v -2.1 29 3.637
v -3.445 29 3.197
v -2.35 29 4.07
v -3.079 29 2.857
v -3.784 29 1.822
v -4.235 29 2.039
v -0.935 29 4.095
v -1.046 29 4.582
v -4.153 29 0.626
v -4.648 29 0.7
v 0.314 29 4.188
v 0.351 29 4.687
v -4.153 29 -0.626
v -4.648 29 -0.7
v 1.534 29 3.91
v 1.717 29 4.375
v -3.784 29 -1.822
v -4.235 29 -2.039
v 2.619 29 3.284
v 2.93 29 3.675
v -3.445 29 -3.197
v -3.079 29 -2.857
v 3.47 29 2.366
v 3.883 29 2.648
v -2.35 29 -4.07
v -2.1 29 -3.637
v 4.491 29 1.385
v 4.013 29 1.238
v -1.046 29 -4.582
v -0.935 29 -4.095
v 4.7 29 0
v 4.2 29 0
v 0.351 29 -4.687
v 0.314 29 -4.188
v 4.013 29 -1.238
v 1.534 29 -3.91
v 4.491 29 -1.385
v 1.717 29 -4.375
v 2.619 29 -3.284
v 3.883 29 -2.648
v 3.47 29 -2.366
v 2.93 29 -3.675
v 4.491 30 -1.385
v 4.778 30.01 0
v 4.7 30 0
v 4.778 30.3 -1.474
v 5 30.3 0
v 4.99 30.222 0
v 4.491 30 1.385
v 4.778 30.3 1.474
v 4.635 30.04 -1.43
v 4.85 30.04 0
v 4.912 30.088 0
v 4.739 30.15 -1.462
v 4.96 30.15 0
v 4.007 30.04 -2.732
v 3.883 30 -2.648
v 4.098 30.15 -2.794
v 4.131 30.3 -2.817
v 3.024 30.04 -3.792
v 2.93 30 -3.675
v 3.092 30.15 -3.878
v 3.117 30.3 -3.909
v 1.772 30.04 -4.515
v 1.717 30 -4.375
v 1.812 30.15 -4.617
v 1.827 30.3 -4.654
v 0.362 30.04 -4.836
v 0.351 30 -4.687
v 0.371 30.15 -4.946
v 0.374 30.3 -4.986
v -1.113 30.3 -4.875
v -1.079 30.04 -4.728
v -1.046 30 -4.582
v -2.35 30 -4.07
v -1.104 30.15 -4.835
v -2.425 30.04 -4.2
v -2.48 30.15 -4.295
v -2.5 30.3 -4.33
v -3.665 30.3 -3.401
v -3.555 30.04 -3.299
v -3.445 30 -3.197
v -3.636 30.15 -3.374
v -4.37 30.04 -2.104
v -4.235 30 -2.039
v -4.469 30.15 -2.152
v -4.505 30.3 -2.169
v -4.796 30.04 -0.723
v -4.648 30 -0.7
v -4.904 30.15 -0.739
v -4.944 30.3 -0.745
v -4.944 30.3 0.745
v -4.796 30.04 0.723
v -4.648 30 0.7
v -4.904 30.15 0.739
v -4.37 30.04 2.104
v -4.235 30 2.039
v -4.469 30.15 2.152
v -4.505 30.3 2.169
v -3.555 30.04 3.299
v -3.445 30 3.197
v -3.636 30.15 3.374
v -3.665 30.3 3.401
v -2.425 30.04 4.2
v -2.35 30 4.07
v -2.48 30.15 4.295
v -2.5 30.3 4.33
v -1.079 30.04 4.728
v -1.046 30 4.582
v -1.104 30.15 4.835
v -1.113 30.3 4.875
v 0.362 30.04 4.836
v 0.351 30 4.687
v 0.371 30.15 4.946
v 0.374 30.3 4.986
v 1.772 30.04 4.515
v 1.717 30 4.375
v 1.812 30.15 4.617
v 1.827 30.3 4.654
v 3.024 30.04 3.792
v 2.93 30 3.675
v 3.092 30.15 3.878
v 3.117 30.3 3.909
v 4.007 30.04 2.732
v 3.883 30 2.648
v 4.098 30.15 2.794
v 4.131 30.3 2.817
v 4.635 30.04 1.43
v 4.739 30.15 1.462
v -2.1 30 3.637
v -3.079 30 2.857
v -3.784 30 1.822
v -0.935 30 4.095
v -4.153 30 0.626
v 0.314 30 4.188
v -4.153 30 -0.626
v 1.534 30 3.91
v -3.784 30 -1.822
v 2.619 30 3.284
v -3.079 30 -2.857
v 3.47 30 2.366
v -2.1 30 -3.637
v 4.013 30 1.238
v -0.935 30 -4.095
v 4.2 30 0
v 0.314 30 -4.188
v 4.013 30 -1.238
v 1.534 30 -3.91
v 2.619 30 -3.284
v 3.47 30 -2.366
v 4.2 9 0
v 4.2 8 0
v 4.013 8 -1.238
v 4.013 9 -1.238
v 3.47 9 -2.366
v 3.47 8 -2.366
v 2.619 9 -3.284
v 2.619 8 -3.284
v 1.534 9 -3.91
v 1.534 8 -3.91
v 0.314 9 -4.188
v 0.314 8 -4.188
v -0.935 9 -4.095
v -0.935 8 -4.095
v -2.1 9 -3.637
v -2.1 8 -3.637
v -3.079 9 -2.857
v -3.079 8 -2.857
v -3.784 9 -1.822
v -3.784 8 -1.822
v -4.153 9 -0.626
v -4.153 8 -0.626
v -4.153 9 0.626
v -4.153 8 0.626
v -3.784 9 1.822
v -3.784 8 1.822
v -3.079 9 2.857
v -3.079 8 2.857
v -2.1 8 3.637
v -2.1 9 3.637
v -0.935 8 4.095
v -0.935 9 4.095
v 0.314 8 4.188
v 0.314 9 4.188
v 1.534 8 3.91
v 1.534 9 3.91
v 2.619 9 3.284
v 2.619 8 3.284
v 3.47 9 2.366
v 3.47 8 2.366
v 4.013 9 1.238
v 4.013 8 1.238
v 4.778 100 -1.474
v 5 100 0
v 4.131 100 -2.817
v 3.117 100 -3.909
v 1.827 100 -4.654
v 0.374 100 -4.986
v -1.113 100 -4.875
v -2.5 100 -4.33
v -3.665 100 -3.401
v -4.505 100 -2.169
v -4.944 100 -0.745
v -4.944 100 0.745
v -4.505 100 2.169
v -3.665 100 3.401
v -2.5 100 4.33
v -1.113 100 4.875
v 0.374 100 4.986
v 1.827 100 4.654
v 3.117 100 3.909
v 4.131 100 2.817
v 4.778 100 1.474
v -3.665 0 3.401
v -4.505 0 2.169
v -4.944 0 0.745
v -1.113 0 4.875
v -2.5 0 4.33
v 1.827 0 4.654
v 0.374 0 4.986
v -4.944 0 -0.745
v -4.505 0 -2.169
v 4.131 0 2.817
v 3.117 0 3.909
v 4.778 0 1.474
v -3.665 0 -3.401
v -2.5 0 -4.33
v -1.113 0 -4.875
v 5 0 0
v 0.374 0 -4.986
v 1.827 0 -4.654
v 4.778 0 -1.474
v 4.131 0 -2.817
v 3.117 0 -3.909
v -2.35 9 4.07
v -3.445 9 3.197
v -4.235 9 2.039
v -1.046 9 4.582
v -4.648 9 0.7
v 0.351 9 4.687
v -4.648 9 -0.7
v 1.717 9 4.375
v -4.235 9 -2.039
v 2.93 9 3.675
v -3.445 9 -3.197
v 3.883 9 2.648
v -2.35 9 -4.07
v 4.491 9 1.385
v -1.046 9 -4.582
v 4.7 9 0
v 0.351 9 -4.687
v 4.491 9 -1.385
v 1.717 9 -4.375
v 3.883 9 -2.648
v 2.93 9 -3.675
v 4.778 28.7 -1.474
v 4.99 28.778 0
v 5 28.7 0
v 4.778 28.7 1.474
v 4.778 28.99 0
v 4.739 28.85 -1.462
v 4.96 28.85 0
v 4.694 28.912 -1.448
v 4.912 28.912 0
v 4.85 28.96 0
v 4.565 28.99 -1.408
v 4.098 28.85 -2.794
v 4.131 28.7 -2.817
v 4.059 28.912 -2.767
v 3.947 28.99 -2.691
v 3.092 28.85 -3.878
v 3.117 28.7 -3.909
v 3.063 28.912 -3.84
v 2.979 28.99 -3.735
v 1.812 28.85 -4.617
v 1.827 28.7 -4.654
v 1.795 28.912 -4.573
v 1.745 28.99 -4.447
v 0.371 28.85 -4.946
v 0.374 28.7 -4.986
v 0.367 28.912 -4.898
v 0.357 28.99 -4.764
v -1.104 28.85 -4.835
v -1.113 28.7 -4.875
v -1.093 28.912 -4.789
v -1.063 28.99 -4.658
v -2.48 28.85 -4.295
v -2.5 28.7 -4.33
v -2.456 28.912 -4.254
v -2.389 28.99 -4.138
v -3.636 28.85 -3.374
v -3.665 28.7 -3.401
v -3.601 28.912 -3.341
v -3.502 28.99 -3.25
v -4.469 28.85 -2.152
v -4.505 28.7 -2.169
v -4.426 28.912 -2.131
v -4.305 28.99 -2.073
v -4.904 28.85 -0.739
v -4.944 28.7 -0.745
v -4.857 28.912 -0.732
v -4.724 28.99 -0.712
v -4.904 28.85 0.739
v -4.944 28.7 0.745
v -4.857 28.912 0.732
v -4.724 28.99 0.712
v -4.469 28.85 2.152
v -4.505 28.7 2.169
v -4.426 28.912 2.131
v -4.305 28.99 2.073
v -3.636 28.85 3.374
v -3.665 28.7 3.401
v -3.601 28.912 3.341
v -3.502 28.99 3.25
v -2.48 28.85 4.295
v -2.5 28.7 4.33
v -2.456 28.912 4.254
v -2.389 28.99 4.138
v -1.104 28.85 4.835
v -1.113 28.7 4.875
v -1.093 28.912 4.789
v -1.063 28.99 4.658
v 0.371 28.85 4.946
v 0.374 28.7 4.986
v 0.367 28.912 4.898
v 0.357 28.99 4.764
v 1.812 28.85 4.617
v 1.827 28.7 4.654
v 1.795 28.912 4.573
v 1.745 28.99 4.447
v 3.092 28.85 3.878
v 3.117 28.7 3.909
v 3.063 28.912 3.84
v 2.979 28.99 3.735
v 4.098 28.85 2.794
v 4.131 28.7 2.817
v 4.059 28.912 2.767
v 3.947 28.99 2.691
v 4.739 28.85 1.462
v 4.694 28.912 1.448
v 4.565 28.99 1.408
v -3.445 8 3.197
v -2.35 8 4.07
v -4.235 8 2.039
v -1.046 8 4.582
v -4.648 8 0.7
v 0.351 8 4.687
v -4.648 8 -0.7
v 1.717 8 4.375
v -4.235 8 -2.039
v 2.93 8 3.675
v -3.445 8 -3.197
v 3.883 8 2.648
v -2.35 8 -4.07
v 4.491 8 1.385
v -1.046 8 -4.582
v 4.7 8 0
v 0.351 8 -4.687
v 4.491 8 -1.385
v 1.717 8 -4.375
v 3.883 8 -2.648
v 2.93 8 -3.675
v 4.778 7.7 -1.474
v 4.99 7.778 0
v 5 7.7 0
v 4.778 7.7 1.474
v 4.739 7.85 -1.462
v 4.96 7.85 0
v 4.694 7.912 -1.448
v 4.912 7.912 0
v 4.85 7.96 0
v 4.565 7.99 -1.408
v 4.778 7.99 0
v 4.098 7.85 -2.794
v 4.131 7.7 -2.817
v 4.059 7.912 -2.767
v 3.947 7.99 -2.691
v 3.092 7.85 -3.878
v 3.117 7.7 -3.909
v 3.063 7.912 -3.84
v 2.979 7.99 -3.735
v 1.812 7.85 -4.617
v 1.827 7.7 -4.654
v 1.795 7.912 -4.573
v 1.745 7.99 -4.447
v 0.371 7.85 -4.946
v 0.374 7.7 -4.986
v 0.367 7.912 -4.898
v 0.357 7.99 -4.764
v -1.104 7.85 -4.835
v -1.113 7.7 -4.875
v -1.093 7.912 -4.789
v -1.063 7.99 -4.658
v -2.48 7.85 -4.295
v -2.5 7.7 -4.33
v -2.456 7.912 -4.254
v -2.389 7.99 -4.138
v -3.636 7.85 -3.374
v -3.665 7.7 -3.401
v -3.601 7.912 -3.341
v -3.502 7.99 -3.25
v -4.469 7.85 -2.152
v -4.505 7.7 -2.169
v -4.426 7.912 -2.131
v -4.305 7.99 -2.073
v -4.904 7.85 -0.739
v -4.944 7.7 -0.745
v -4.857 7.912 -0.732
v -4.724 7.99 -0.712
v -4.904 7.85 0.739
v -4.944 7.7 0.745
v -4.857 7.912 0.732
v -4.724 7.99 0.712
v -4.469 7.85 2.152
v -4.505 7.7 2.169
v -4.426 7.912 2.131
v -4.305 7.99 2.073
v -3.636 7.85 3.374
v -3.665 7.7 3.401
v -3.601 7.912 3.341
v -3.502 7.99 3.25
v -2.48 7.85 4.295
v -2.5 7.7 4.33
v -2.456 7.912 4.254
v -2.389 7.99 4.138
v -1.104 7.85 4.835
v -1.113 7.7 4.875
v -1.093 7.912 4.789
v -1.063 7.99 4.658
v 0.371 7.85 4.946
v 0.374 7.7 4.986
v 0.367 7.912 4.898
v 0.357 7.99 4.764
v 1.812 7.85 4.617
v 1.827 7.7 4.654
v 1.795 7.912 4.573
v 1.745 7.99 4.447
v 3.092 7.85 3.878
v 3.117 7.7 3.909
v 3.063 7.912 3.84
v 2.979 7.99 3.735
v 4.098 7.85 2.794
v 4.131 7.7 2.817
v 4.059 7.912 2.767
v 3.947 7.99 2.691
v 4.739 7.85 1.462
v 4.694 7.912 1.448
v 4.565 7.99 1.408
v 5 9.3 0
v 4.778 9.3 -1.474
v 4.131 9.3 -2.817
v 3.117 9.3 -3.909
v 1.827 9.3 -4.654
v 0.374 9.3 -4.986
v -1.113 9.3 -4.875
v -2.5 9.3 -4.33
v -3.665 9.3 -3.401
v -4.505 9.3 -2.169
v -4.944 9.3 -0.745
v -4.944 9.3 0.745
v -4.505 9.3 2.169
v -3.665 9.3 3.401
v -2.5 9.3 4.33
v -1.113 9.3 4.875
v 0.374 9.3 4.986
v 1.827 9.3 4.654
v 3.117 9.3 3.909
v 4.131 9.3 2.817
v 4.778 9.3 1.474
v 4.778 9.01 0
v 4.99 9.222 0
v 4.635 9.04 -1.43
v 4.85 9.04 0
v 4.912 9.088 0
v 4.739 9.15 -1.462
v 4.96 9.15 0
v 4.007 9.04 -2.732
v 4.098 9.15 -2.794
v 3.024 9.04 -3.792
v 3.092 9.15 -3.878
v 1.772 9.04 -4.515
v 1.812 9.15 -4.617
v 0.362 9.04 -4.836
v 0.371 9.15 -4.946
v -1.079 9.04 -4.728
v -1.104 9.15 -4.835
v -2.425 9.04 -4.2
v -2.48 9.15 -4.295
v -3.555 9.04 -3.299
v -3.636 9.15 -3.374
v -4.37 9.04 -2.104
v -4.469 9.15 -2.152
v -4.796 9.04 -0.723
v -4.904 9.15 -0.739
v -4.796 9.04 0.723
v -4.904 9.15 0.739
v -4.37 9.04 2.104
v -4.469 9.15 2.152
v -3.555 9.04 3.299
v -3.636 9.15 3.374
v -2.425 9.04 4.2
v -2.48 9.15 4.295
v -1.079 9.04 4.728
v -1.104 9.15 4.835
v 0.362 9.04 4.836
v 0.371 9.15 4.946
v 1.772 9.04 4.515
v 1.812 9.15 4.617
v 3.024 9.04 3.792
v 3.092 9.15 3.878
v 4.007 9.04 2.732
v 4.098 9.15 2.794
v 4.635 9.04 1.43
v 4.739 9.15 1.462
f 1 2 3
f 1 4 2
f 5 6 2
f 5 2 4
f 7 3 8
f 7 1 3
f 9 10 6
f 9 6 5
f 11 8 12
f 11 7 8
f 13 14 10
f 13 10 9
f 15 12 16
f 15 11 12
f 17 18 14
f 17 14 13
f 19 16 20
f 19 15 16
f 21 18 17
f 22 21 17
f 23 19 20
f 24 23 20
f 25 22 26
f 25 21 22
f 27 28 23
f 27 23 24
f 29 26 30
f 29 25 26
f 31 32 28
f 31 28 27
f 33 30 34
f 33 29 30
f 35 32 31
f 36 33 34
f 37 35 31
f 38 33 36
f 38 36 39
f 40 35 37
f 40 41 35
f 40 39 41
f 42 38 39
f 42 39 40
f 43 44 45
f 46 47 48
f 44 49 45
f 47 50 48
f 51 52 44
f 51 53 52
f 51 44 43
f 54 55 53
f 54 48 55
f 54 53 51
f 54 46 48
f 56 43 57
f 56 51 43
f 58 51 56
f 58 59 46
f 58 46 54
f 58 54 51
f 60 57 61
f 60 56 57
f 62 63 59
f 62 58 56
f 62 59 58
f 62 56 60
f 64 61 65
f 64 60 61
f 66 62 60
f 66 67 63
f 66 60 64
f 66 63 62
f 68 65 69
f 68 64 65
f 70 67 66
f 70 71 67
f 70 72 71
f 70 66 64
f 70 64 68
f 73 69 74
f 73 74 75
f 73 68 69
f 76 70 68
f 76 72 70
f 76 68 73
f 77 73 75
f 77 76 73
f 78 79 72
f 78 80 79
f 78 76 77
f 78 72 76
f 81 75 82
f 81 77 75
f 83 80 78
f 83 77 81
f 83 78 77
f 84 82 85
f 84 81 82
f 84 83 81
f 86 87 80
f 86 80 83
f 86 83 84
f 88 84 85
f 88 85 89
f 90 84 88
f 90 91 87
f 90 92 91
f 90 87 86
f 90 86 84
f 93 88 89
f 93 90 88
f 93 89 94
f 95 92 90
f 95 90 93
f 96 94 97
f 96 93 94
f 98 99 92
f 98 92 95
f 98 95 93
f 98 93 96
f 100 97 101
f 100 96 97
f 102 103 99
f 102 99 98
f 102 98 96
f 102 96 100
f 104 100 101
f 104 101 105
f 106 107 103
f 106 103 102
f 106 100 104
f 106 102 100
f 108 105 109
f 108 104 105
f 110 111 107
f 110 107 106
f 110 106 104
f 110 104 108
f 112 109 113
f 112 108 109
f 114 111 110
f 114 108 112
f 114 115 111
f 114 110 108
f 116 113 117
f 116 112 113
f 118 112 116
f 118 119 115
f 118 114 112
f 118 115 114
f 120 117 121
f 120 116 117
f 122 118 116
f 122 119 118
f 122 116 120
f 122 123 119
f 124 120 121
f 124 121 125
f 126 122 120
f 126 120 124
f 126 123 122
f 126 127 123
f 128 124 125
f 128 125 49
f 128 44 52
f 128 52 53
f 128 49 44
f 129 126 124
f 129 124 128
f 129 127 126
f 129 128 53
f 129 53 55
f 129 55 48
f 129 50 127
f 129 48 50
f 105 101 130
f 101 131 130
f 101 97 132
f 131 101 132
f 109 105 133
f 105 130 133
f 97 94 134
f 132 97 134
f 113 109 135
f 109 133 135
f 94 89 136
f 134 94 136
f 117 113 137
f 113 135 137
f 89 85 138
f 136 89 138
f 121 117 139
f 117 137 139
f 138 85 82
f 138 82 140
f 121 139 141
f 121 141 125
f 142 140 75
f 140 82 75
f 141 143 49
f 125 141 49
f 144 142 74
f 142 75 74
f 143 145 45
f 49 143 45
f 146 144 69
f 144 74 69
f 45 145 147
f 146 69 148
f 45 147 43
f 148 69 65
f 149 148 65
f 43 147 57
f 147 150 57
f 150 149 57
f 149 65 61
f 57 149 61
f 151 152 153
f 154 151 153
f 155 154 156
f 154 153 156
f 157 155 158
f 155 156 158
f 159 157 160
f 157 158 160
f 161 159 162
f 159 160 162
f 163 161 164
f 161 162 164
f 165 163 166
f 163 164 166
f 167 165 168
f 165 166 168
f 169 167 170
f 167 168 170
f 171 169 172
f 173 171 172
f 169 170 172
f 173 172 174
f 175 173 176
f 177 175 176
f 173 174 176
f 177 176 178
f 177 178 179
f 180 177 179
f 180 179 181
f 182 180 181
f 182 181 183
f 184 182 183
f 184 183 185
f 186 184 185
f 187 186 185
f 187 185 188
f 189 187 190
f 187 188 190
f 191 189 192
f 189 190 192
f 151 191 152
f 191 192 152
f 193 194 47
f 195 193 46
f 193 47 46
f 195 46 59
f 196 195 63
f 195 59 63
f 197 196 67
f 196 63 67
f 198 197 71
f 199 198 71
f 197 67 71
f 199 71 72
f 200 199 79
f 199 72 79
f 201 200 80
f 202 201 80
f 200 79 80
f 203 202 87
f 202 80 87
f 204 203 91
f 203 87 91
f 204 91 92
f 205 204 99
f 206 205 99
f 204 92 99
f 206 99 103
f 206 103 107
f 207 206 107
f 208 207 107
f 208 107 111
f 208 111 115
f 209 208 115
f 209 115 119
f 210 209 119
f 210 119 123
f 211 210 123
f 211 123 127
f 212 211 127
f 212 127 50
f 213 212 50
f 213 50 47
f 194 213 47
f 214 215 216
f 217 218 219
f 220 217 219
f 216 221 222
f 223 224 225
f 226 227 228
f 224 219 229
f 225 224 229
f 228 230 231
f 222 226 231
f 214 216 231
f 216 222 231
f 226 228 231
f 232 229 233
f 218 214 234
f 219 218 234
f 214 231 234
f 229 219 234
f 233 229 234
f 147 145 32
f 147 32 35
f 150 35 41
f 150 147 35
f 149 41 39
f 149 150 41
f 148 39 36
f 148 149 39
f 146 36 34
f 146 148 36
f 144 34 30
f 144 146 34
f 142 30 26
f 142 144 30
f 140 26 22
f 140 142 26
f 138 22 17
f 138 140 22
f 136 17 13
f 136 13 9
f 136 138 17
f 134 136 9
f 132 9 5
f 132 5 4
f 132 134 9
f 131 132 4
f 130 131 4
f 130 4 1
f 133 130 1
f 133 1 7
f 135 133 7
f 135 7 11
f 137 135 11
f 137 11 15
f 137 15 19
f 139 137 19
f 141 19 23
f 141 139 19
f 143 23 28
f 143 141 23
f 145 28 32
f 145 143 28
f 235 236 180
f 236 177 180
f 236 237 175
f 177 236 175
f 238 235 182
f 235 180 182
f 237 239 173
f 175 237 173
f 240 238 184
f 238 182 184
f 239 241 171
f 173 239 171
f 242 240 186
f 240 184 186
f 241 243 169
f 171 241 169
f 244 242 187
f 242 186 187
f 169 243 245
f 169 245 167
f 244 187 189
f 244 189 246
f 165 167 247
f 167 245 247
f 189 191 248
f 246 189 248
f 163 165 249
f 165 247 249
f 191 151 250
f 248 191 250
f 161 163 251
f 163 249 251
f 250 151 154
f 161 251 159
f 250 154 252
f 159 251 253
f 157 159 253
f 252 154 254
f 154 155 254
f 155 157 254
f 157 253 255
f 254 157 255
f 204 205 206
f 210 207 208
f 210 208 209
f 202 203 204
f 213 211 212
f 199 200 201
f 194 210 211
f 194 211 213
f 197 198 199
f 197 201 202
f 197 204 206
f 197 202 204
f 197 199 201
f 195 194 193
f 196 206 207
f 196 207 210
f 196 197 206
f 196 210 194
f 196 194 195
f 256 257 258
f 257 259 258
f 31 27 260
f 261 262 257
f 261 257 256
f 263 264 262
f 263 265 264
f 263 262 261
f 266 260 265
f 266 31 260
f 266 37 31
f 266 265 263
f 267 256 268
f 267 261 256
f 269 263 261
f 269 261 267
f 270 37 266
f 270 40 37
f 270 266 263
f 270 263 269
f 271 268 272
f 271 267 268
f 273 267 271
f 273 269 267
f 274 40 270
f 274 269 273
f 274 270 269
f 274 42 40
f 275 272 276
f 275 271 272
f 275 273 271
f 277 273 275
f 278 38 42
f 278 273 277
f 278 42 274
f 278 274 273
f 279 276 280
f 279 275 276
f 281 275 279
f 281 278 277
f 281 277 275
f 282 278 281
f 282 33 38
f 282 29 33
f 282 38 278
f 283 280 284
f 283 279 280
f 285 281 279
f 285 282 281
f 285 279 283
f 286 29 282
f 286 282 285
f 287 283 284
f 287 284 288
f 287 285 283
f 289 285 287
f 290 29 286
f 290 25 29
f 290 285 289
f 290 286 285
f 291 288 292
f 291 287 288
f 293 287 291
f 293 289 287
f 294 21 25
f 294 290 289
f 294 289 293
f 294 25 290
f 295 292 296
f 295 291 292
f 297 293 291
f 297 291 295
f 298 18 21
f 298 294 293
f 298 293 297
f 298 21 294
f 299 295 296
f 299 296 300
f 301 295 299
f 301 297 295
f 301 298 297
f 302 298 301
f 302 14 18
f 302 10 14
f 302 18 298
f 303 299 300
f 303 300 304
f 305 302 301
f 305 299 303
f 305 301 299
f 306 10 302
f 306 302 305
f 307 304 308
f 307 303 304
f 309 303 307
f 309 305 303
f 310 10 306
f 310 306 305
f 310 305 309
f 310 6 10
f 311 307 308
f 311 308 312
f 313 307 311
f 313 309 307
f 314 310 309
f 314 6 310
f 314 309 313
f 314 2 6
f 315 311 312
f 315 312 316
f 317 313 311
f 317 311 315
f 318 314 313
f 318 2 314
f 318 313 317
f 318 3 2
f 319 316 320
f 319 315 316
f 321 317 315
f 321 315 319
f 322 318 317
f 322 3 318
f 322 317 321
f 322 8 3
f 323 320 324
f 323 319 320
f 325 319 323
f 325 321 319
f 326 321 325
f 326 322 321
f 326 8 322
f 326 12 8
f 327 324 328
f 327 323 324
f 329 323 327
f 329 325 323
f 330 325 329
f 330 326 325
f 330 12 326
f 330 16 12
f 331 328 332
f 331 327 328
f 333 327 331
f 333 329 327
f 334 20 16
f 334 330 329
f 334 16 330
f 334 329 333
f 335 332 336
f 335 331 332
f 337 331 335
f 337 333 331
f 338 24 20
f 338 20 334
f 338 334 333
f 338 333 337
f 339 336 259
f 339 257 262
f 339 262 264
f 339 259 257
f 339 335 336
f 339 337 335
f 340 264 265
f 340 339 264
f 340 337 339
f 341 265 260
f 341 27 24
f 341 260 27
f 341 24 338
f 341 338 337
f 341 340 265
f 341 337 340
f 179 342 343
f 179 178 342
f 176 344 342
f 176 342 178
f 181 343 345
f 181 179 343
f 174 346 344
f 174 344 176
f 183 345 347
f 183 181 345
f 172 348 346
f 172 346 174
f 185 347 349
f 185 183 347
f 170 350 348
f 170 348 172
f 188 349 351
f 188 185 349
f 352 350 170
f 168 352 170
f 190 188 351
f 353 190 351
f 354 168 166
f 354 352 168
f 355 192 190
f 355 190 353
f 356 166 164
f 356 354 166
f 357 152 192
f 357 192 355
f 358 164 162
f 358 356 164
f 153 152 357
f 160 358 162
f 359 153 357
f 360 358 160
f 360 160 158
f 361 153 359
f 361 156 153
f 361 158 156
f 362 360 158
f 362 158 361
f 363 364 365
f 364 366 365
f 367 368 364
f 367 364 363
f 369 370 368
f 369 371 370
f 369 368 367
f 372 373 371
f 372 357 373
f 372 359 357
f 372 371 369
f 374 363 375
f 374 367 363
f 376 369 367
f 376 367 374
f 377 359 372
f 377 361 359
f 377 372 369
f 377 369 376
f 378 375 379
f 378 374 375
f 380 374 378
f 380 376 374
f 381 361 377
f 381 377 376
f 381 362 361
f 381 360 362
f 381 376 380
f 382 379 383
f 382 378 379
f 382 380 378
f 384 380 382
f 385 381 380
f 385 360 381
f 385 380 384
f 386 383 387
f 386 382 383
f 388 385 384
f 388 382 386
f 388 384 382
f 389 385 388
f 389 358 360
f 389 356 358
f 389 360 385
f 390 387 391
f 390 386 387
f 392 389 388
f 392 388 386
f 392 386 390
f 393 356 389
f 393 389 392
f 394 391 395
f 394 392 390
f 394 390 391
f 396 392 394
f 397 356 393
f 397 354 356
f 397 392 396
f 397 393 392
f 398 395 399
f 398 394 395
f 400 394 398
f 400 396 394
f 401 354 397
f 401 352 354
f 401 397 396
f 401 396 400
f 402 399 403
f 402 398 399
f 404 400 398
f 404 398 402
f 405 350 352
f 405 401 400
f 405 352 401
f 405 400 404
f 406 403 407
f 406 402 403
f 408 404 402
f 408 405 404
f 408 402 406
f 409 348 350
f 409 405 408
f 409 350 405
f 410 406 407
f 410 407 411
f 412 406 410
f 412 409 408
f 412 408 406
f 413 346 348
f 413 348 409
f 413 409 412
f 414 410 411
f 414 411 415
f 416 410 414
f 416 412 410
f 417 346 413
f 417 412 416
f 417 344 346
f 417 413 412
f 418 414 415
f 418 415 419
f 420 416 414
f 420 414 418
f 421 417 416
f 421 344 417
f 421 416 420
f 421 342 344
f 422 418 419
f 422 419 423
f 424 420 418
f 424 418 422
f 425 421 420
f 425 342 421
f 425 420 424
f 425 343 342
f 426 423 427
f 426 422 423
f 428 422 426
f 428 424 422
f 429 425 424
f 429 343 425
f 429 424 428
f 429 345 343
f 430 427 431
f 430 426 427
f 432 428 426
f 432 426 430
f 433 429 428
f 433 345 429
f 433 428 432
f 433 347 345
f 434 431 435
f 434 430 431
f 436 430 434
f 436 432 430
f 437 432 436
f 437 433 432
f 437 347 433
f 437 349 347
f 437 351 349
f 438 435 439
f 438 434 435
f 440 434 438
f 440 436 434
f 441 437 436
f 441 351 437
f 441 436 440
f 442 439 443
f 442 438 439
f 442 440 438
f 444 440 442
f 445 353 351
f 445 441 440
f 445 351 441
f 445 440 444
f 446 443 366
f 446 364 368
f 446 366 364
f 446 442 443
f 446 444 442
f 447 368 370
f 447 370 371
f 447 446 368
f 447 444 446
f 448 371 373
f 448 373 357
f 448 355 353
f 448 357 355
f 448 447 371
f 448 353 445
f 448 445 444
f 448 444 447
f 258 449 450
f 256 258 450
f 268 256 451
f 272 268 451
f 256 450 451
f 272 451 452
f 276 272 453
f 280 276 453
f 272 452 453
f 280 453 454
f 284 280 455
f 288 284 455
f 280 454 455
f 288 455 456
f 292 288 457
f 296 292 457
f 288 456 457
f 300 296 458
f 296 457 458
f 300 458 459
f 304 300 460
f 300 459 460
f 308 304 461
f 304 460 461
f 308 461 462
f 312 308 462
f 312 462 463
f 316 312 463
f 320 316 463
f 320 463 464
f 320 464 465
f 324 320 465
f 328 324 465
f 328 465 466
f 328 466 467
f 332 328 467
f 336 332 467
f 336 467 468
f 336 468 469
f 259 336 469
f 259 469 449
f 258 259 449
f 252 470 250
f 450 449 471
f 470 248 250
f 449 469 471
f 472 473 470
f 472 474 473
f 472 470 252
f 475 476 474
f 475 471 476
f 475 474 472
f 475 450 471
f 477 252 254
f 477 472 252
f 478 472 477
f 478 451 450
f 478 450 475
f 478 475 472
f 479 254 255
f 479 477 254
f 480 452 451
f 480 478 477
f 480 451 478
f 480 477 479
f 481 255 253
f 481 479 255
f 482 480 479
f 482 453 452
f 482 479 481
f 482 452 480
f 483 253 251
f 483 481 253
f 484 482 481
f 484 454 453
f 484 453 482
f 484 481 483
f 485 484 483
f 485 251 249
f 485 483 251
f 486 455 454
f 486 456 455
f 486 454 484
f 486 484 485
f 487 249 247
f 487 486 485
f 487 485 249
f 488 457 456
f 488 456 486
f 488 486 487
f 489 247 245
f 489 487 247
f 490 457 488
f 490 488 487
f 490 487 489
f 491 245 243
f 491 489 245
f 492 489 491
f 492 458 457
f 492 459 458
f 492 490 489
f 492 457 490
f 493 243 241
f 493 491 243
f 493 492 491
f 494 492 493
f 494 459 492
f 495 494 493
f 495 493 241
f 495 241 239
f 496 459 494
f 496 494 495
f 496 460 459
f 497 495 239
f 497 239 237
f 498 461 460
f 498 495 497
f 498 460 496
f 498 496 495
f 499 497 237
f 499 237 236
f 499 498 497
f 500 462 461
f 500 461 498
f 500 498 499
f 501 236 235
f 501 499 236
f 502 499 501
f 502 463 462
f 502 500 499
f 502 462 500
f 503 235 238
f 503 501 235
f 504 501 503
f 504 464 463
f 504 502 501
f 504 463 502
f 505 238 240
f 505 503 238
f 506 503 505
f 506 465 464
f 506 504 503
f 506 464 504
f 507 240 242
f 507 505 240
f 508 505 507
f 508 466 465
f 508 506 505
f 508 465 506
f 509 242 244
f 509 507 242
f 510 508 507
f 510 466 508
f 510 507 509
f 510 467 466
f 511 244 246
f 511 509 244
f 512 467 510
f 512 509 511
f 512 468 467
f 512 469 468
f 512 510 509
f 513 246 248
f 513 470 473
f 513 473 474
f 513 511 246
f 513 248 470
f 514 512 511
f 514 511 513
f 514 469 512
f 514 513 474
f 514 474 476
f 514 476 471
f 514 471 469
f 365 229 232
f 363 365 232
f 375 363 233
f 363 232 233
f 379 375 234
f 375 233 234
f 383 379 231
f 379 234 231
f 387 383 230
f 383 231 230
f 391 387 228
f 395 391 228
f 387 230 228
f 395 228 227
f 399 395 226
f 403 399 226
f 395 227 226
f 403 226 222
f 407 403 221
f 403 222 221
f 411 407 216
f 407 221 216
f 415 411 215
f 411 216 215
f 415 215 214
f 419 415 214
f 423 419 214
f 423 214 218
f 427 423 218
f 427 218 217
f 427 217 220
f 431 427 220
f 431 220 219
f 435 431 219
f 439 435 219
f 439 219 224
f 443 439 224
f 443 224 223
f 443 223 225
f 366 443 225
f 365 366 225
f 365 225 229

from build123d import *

# Parameters (mm, degrees)
SKETCH1_R           = 5
BOSS_EXTRUDE1_DEPTH = 100
CUT_EXTRUDE1_START  = 29
SKETCH2_R           = 5
SKETCH2_R_2         = 4.2
CUT_EXTRUDE1_DEPTH  = 1
FILLET1_R           = 0.3
CUT_EXTRUDE2_START  = 8
SKETCH2_2_R         = 5
SKETCH2_2_R_2       = 4.2
CUT_EXTRUDE2_DEPTH  = 1
FILLET2_R           = 0.3


with BuildPart() as part:
    # Sketch1 → Boss-Extrude1 (new body)
    with BuildSketch(Plane(origin=(0, 0, 0), x_dir=(1, 0, 0), z_dir=(0, 1, 0))):
        Circle(SKETCH1_R)
    extrude(amount=BOSS_EXTRUDE1_DEPTH)

    # Sketch2 → Cut-Extrude1 (cut)
    with BuildSketch(Plane(origin=(0, 0, 0), x_dir=(1, 0, 0), z_dir=(0, 1, 0)).offset(CUT_EXTRUDE1_START)):
        Circle(SKETCH2_R)
        Circle(SKETCH2_R_2, mode=Mode.SUBTRACT)
    extrude(amount=CUT_EXTRUDE1_DEPTH, mode=Mode.SUBTRACT)

    # Fillet1
    fillet1_edges = [part.edges().sort_by_distance(p)[0] for p in [
        (-5, 30, 0),
        (-5, 29, 0),
    ]]
    fillet(fillet1_edges, radius=FILLET1_R)

    # Sketch2<2> → Cut-Extrude2 (cut)
    with BuildSketch(Plane(origin=(0, 0, 0), x_dir=(1, 0, 0), z_dir=(0, 1, 0)).offset(CUT_EXTRUDE2_START)):
        Circle(SKETCH2_2_R)
        Circle(SKETCH2_2_R_2, mode=Mode.SUBTRACT)
    extrude(amount=CUT_EXTRUDE2_DEPTH, mode=Mode.SUBTRACT)

    # Fillet2
    fillet2_edges = [part.edges().sort_by_distance(p)[0] for p in [
        (-5, 8, 0),
        (-5, 9, 0),
    ]]
    fillet(fillet2_edges, radius=FILLET2_R)


solid = part.part
